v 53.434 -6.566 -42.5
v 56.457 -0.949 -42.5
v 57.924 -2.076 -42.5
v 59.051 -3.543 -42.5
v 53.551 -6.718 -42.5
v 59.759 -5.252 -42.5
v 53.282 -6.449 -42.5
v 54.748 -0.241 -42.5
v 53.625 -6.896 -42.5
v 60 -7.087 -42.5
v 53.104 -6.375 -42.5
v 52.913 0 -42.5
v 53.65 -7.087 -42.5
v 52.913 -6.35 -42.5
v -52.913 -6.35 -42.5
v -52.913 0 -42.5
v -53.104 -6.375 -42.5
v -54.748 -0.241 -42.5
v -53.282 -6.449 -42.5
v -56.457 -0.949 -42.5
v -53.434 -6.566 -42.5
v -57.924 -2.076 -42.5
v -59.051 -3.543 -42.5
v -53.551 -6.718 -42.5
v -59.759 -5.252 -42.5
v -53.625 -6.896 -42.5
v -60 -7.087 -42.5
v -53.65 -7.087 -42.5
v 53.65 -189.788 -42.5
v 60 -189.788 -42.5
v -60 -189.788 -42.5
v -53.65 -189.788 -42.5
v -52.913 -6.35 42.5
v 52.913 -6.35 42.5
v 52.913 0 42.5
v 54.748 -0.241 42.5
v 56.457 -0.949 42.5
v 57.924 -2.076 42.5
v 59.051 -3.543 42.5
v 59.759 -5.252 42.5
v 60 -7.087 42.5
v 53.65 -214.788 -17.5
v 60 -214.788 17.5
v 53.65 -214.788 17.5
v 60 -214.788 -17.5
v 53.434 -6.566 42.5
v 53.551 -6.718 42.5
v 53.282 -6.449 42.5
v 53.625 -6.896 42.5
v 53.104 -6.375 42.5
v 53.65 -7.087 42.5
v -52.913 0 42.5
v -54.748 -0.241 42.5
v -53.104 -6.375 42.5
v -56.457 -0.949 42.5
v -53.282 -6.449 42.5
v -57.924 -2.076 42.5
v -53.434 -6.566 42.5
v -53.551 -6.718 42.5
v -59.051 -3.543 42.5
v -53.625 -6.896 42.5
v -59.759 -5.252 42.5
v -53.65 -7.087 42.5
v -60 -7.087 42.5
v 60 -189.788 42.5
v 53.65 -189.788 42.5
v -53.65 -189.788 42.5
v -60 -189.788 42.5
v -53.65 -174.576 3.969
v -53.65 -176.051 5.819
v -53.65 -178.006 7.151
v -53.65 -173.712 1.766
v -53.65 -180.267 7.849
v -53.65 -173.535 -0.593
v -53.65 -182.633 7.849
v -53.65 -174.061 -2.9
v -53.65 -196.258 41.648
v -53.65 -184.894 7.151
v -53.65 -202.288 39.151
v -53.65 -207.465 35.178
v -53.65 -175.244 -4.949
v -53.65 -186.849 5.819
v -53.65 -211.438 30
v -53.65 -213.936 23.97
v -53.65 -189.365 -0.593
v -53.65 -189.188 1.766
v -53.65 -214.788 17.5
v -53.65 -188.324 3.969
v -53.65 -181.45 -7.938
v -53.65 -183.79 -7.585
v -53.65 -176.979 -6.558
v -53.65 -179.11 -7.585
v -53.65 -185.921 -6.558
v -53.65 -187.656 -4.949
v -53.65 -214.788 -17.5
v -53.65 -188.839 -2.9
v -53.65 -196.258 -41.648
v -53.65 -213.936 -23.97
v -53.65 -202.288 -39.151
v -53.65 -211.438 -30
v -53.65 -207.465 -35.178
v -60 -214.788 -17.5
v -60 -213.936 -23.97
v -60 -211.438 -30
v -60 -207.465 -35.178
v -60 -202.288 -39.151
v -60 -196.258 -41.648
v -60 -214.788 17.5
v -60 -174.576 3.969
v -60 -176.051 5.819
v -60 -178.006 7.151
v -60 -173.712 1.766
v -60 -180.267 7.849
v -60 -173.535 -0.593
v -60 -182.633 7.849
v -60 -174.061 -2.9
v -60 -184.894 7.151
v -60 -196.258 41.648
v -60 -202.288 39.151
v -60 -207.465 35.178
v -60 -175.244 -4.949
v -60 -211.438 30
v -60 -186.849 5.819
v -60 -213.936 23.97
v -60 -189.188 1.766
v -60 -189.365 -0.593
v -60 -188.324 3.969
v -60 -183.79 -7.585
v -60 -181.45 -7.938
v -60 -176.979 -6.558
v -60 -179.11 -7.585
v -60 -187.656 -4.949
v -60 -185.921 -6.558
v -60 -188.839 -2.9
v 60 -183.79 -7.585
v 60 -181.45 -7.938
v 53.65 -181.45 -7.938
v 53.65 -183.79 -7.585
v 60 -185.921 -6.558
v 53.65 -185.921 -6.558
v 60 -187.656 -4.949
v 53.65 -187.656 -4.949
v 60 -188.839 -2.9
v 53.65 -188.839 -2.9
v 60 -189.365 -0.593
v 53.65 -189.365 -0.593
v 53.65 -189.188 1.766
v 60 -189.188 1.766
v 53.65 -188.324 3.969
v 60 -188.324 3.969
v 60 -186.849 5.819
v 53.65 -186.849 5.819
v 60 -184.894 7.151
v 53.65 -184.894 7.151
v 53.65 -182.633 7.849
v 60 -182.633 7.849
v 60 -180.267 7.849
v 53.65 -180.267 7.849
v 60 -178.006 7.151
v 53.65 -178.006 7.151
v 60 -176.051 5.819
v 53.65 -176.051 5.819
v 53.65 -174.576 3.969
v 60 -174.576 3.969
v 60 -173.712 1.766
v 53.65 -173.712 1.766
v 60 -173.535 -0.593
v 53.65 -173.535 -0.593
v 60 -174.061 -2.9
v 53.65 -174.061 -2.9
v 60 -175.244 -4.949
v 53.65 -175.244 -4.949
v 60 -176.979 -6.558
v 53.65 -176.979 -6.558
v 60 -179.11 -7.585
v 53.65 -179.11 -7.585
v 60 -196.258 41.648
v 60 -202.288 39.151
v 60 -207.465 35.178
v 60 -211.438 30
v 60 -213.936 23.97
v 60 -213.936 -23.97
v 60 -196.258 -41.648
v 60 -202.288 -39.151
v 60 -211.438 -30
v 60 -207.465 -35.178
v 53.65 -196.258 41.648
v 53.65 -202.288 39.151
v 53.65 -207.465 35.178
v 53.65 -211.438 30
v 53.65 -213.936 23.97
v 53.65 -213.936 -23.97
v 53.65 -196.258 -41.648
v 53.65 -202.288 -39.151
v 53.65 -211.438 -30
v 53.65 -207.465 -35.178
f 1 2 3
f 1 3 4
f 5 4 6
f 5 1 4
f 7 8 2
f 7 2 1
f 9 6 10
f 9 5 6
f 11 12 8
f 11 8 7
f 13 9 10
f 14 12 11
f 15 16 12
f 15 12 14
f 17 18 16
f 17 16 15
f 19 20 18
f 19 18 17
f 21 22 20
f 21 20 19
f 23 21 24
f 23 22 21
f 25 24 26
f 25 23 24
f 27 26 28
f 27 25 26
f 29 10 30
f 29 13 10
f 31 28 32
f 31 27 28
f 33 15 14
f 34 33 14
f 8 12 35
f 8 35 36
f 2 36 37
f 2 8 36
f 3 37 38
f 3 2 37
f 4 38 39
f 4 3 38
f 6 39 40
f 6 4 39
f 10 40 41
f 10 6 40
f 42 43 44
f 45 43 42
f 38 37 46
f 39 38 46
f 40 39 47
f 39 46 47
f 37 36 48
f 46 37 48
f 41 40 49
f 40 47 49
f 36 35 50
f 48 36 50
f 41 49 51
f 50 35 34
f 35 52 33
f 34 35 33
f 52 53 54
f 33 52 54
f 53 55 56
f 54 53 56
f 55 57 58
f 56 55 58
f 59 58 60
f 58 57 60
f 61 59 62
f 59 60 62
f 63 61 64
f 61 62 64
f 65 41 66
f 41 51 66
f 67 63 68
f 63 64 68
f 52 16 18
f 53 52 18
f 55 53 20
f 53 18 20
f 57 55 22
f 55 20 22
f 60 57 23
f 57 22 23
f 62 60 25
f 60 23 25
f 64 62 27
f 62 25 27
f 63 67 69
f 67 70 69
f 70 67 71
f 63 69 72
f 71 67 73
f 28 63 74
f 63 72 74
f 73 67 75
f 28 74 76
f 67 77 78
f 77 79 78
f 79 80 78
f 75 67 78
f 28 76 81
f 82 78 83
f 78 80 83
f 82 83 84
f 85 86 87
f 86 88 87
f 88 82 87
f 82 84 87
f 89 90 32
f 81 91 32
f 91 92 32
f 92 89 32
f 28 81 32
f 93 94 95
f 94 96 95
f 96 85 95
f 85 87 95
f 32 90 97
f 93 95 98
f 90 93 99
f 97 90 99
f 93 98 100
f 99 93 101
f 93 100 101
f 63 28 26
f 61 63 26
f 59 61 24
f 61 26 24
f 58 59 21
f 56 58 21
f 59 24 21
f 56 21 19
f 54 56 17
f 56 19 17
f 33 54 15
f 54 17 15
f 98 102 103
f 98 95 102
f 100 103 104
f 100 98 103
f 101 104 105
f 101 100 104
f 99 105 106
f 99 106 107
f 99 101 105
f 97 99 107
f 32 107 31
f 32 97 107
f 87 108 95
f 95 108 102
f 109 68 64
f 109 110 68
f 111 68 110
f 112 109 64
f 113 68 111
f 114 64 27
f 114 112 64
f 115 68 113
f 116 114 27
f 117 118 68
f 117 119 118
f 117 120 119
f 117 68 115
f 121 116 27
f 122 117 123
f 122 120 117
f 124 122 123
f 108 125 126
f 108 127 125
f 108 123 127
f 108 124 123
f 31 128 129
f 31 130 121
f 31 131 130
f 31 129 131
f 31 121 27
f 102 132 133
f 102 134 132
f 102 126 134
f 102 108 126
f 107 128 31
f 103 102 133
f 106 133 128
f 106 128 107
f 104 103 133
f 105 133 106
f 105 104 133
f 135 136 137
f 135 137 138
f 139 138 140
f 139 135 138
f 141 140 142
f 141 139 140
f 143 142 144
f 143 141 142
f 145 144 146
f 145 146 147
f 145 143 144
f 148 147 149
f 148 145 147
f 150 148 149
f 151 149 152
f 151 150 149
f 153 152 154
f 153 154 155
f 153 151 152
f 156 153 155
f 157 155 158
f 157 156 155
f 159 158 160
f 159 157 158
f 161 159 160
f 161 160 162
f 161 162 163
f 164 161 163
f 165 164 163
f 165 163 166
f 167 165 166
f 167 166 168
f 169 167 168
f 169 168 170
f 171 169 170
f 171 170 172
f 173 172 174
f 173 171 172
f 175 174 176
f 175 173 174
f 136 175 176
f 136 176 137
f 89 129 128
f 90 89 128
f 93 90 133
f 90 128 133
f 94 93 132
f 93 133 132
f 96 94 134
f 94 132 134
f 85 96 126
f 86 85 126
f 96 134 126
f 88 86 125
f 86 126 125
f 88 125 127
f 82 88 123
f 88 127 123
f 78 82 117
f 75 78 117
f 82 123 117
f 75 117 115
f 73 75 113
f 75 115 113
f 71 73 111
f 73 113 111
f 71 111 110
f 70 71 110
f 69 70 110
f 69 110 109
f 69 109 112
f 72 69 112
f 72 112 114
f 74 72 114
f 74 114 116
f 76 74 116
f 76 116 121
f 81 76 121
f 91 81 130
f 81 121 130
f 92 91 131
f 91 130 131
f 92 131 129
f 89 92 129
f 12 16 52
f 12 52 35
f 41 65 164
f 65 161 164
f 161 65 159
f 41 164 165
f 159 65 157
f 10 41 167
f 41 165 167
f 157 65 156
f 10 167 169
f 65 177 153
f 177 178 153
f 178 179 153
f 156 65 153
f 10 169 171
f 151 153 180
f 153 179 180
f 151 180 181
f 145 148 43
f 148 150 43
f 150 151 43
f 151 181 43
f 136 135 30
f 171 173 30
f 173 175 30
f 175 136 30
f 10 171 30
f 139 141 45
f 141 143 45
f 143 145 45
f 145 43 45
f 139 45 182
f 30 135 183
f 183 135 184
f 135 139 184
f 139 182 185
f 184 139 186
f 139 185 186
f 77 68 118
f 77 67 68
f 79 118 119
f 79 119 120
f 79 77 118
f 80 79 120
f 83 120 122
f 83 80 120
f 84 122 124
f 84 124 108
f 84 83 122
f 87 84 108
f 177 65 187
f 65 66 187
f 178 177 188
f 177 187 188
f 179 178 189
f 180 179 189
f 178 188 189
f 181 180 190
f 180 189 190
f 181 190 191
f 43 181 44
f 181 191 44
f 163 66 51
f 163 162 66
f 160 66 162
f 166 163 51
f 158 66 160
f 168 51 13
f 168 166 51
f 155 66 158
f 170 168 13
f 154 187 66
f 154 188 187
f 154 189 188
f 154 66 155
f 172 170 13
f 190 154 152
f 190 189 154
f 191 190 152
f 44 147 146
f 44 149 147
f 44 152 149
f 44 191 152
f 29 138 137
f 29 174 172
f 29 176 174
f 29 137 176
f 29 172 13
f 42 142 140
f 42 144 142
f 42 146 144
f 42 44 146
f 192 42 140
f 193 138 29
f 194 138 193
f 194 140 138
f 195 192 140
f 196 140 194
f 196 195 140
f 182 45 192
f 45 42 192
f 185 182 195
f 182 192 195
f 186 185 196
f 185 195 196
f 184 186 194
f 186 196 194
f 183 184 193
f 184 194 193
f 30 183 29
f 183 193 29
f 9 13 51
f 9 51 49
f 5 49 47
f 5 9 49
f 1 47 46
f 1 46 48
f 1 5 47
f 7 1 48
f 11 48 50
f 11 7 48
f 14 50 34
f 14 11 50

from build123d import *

# Parameters (mm, degrees)
SKETCH3_W                    = 120
SKETCH3_H                    = 85
BASE_FLANGE1_DEPTH           = 6.35
EDGE_FLANGE1_STRIP_W         = 26.8732
EDGE_FLANGE1_STRIP_H         = 6.35
EDGE_FLANGE1_STRIP_CUT_DEPTH = 85
EDGE_FLANGE1_DEPTH           = 85
EDGE_FLANGE1_PROFILE_W       = 85
EDGE_FLANGE1_PROFILE_H       = 207.7009
EDGE_FLANGE1_PROFILE_R       = 7.9375
EDGE_FLANGE1_FLAT_DEPTH      = 6.35
FILLET1_R                    = 25


# Sheet-metal steps are written as plain solids
with BuildPart() as part:
    # Sketch3 → Base-Flange1 (new body)
    with BuildSketch(Plane(origin=(0, 0, 0), x_dir=(1, 0, 0), z_dir=(0, 1, 0))):
        Rectangle(SKETCH3_W, SKETCH3_H)
    extrude(amount=-BASE_FLANGE1_DEPTH)

    # Edge-Flange1 strip (across the edge) → Edge-Flange1 strip cut (cut)
    with BuildSketch(Plane(origin=(60, -6.35, -42.5), x_dir=(-1, 0, 0), z_dir=(0, 0, 1))):
        with Locations((-6.35, -3.175)):
            Rectangle(EDGE_FLANGE1_STRIP_W, EDGE_FLANGE1_STRIP_H)
    edge_flange1_strip_cut = extrude(amount=EDGE_FLANGE1_STRIP_CUT_DEPTH, mode=Mode.SUBTRACT)

    # Edge-Flange1 bend section (across the edge) → Edge-Flange1 (add)
    with BuildSketch(Plane(origin=(60, -6.35, -42.5), x_dir=(-1, 0, 0), z_dir=(0, 0, 1))):
        with BuildLine():
            Line((0, 0.7366), (6.35, 0.7366))
            ThreePointArc((6.35, 0.7366), (6.565745145, 0.215745145), (7.0866, 0))
            Line((7.0866, 0), (7.0866, -6.35))
            ThreePointArc((7.0866, -6.35), (2.075617084, -4.274382916), (0, 0.7366))
        make_face()
    edge_flange1 = extrude(amount=EDGE_FLANGE1_DEPTH)

    # Edge-Flange1 profile (on flange) → Edge-Flange1 flat (add)
    with BuildSketch(Plane(origin=(60, -6.35, 0), x_dir=(0, 0, -1), z_dir=(-1, 0, 0))):
        with Locations((0, 104.58705)):
            Rectangle(EDGE_FLANGE1_PROFILE_W, EDGE_FLANGE1_PROFILE_H)
        with Locations((0, 175.1)):
            Circle(EDGE_FLANGE1_PROFILE_R, mode=Mode.SUBTRACT)
    edge_flange1_flat = extrude(amount=EDGE_FLANGE1_FLAT_DEPTH)

    # Mirror1: Edge-Flange1 strip cut, Edge-Flange1, Edge-Flange1 flat across plane
    add(edge_flange1_strip_cut.mirror(Plane(origin=(0, 0, 0), x_dir=(0, 0, 1), z_dir=(1, 0, 0))), mode=Mode.SUBTRACT)
    add(edge_flange1.mirror(Plane(origin=(0, 0, 0), x_dir=(0, 0, 1), z_dir=(1, 0, 0))))
    add(edge_flange1_flat.mirror(Plane(origin=(0, 0, 0), x_dir=(0, 0, 1), z_dir=(1, 0, 0))))

    # Fillet1
    fillet1_edges = [part.edges().sort_by_distance(p)[0] for p in [
        (56.825, -214.7875, -42.5),
        (56.825, -214.7875, 42.5),
        (-56.825, -214.7875, 42.5),
        (-56.825, -214.7875, -42.5),
    ]]
    fillet(fillet1_edges, radius=FILLET1_R)


solid = part.part
